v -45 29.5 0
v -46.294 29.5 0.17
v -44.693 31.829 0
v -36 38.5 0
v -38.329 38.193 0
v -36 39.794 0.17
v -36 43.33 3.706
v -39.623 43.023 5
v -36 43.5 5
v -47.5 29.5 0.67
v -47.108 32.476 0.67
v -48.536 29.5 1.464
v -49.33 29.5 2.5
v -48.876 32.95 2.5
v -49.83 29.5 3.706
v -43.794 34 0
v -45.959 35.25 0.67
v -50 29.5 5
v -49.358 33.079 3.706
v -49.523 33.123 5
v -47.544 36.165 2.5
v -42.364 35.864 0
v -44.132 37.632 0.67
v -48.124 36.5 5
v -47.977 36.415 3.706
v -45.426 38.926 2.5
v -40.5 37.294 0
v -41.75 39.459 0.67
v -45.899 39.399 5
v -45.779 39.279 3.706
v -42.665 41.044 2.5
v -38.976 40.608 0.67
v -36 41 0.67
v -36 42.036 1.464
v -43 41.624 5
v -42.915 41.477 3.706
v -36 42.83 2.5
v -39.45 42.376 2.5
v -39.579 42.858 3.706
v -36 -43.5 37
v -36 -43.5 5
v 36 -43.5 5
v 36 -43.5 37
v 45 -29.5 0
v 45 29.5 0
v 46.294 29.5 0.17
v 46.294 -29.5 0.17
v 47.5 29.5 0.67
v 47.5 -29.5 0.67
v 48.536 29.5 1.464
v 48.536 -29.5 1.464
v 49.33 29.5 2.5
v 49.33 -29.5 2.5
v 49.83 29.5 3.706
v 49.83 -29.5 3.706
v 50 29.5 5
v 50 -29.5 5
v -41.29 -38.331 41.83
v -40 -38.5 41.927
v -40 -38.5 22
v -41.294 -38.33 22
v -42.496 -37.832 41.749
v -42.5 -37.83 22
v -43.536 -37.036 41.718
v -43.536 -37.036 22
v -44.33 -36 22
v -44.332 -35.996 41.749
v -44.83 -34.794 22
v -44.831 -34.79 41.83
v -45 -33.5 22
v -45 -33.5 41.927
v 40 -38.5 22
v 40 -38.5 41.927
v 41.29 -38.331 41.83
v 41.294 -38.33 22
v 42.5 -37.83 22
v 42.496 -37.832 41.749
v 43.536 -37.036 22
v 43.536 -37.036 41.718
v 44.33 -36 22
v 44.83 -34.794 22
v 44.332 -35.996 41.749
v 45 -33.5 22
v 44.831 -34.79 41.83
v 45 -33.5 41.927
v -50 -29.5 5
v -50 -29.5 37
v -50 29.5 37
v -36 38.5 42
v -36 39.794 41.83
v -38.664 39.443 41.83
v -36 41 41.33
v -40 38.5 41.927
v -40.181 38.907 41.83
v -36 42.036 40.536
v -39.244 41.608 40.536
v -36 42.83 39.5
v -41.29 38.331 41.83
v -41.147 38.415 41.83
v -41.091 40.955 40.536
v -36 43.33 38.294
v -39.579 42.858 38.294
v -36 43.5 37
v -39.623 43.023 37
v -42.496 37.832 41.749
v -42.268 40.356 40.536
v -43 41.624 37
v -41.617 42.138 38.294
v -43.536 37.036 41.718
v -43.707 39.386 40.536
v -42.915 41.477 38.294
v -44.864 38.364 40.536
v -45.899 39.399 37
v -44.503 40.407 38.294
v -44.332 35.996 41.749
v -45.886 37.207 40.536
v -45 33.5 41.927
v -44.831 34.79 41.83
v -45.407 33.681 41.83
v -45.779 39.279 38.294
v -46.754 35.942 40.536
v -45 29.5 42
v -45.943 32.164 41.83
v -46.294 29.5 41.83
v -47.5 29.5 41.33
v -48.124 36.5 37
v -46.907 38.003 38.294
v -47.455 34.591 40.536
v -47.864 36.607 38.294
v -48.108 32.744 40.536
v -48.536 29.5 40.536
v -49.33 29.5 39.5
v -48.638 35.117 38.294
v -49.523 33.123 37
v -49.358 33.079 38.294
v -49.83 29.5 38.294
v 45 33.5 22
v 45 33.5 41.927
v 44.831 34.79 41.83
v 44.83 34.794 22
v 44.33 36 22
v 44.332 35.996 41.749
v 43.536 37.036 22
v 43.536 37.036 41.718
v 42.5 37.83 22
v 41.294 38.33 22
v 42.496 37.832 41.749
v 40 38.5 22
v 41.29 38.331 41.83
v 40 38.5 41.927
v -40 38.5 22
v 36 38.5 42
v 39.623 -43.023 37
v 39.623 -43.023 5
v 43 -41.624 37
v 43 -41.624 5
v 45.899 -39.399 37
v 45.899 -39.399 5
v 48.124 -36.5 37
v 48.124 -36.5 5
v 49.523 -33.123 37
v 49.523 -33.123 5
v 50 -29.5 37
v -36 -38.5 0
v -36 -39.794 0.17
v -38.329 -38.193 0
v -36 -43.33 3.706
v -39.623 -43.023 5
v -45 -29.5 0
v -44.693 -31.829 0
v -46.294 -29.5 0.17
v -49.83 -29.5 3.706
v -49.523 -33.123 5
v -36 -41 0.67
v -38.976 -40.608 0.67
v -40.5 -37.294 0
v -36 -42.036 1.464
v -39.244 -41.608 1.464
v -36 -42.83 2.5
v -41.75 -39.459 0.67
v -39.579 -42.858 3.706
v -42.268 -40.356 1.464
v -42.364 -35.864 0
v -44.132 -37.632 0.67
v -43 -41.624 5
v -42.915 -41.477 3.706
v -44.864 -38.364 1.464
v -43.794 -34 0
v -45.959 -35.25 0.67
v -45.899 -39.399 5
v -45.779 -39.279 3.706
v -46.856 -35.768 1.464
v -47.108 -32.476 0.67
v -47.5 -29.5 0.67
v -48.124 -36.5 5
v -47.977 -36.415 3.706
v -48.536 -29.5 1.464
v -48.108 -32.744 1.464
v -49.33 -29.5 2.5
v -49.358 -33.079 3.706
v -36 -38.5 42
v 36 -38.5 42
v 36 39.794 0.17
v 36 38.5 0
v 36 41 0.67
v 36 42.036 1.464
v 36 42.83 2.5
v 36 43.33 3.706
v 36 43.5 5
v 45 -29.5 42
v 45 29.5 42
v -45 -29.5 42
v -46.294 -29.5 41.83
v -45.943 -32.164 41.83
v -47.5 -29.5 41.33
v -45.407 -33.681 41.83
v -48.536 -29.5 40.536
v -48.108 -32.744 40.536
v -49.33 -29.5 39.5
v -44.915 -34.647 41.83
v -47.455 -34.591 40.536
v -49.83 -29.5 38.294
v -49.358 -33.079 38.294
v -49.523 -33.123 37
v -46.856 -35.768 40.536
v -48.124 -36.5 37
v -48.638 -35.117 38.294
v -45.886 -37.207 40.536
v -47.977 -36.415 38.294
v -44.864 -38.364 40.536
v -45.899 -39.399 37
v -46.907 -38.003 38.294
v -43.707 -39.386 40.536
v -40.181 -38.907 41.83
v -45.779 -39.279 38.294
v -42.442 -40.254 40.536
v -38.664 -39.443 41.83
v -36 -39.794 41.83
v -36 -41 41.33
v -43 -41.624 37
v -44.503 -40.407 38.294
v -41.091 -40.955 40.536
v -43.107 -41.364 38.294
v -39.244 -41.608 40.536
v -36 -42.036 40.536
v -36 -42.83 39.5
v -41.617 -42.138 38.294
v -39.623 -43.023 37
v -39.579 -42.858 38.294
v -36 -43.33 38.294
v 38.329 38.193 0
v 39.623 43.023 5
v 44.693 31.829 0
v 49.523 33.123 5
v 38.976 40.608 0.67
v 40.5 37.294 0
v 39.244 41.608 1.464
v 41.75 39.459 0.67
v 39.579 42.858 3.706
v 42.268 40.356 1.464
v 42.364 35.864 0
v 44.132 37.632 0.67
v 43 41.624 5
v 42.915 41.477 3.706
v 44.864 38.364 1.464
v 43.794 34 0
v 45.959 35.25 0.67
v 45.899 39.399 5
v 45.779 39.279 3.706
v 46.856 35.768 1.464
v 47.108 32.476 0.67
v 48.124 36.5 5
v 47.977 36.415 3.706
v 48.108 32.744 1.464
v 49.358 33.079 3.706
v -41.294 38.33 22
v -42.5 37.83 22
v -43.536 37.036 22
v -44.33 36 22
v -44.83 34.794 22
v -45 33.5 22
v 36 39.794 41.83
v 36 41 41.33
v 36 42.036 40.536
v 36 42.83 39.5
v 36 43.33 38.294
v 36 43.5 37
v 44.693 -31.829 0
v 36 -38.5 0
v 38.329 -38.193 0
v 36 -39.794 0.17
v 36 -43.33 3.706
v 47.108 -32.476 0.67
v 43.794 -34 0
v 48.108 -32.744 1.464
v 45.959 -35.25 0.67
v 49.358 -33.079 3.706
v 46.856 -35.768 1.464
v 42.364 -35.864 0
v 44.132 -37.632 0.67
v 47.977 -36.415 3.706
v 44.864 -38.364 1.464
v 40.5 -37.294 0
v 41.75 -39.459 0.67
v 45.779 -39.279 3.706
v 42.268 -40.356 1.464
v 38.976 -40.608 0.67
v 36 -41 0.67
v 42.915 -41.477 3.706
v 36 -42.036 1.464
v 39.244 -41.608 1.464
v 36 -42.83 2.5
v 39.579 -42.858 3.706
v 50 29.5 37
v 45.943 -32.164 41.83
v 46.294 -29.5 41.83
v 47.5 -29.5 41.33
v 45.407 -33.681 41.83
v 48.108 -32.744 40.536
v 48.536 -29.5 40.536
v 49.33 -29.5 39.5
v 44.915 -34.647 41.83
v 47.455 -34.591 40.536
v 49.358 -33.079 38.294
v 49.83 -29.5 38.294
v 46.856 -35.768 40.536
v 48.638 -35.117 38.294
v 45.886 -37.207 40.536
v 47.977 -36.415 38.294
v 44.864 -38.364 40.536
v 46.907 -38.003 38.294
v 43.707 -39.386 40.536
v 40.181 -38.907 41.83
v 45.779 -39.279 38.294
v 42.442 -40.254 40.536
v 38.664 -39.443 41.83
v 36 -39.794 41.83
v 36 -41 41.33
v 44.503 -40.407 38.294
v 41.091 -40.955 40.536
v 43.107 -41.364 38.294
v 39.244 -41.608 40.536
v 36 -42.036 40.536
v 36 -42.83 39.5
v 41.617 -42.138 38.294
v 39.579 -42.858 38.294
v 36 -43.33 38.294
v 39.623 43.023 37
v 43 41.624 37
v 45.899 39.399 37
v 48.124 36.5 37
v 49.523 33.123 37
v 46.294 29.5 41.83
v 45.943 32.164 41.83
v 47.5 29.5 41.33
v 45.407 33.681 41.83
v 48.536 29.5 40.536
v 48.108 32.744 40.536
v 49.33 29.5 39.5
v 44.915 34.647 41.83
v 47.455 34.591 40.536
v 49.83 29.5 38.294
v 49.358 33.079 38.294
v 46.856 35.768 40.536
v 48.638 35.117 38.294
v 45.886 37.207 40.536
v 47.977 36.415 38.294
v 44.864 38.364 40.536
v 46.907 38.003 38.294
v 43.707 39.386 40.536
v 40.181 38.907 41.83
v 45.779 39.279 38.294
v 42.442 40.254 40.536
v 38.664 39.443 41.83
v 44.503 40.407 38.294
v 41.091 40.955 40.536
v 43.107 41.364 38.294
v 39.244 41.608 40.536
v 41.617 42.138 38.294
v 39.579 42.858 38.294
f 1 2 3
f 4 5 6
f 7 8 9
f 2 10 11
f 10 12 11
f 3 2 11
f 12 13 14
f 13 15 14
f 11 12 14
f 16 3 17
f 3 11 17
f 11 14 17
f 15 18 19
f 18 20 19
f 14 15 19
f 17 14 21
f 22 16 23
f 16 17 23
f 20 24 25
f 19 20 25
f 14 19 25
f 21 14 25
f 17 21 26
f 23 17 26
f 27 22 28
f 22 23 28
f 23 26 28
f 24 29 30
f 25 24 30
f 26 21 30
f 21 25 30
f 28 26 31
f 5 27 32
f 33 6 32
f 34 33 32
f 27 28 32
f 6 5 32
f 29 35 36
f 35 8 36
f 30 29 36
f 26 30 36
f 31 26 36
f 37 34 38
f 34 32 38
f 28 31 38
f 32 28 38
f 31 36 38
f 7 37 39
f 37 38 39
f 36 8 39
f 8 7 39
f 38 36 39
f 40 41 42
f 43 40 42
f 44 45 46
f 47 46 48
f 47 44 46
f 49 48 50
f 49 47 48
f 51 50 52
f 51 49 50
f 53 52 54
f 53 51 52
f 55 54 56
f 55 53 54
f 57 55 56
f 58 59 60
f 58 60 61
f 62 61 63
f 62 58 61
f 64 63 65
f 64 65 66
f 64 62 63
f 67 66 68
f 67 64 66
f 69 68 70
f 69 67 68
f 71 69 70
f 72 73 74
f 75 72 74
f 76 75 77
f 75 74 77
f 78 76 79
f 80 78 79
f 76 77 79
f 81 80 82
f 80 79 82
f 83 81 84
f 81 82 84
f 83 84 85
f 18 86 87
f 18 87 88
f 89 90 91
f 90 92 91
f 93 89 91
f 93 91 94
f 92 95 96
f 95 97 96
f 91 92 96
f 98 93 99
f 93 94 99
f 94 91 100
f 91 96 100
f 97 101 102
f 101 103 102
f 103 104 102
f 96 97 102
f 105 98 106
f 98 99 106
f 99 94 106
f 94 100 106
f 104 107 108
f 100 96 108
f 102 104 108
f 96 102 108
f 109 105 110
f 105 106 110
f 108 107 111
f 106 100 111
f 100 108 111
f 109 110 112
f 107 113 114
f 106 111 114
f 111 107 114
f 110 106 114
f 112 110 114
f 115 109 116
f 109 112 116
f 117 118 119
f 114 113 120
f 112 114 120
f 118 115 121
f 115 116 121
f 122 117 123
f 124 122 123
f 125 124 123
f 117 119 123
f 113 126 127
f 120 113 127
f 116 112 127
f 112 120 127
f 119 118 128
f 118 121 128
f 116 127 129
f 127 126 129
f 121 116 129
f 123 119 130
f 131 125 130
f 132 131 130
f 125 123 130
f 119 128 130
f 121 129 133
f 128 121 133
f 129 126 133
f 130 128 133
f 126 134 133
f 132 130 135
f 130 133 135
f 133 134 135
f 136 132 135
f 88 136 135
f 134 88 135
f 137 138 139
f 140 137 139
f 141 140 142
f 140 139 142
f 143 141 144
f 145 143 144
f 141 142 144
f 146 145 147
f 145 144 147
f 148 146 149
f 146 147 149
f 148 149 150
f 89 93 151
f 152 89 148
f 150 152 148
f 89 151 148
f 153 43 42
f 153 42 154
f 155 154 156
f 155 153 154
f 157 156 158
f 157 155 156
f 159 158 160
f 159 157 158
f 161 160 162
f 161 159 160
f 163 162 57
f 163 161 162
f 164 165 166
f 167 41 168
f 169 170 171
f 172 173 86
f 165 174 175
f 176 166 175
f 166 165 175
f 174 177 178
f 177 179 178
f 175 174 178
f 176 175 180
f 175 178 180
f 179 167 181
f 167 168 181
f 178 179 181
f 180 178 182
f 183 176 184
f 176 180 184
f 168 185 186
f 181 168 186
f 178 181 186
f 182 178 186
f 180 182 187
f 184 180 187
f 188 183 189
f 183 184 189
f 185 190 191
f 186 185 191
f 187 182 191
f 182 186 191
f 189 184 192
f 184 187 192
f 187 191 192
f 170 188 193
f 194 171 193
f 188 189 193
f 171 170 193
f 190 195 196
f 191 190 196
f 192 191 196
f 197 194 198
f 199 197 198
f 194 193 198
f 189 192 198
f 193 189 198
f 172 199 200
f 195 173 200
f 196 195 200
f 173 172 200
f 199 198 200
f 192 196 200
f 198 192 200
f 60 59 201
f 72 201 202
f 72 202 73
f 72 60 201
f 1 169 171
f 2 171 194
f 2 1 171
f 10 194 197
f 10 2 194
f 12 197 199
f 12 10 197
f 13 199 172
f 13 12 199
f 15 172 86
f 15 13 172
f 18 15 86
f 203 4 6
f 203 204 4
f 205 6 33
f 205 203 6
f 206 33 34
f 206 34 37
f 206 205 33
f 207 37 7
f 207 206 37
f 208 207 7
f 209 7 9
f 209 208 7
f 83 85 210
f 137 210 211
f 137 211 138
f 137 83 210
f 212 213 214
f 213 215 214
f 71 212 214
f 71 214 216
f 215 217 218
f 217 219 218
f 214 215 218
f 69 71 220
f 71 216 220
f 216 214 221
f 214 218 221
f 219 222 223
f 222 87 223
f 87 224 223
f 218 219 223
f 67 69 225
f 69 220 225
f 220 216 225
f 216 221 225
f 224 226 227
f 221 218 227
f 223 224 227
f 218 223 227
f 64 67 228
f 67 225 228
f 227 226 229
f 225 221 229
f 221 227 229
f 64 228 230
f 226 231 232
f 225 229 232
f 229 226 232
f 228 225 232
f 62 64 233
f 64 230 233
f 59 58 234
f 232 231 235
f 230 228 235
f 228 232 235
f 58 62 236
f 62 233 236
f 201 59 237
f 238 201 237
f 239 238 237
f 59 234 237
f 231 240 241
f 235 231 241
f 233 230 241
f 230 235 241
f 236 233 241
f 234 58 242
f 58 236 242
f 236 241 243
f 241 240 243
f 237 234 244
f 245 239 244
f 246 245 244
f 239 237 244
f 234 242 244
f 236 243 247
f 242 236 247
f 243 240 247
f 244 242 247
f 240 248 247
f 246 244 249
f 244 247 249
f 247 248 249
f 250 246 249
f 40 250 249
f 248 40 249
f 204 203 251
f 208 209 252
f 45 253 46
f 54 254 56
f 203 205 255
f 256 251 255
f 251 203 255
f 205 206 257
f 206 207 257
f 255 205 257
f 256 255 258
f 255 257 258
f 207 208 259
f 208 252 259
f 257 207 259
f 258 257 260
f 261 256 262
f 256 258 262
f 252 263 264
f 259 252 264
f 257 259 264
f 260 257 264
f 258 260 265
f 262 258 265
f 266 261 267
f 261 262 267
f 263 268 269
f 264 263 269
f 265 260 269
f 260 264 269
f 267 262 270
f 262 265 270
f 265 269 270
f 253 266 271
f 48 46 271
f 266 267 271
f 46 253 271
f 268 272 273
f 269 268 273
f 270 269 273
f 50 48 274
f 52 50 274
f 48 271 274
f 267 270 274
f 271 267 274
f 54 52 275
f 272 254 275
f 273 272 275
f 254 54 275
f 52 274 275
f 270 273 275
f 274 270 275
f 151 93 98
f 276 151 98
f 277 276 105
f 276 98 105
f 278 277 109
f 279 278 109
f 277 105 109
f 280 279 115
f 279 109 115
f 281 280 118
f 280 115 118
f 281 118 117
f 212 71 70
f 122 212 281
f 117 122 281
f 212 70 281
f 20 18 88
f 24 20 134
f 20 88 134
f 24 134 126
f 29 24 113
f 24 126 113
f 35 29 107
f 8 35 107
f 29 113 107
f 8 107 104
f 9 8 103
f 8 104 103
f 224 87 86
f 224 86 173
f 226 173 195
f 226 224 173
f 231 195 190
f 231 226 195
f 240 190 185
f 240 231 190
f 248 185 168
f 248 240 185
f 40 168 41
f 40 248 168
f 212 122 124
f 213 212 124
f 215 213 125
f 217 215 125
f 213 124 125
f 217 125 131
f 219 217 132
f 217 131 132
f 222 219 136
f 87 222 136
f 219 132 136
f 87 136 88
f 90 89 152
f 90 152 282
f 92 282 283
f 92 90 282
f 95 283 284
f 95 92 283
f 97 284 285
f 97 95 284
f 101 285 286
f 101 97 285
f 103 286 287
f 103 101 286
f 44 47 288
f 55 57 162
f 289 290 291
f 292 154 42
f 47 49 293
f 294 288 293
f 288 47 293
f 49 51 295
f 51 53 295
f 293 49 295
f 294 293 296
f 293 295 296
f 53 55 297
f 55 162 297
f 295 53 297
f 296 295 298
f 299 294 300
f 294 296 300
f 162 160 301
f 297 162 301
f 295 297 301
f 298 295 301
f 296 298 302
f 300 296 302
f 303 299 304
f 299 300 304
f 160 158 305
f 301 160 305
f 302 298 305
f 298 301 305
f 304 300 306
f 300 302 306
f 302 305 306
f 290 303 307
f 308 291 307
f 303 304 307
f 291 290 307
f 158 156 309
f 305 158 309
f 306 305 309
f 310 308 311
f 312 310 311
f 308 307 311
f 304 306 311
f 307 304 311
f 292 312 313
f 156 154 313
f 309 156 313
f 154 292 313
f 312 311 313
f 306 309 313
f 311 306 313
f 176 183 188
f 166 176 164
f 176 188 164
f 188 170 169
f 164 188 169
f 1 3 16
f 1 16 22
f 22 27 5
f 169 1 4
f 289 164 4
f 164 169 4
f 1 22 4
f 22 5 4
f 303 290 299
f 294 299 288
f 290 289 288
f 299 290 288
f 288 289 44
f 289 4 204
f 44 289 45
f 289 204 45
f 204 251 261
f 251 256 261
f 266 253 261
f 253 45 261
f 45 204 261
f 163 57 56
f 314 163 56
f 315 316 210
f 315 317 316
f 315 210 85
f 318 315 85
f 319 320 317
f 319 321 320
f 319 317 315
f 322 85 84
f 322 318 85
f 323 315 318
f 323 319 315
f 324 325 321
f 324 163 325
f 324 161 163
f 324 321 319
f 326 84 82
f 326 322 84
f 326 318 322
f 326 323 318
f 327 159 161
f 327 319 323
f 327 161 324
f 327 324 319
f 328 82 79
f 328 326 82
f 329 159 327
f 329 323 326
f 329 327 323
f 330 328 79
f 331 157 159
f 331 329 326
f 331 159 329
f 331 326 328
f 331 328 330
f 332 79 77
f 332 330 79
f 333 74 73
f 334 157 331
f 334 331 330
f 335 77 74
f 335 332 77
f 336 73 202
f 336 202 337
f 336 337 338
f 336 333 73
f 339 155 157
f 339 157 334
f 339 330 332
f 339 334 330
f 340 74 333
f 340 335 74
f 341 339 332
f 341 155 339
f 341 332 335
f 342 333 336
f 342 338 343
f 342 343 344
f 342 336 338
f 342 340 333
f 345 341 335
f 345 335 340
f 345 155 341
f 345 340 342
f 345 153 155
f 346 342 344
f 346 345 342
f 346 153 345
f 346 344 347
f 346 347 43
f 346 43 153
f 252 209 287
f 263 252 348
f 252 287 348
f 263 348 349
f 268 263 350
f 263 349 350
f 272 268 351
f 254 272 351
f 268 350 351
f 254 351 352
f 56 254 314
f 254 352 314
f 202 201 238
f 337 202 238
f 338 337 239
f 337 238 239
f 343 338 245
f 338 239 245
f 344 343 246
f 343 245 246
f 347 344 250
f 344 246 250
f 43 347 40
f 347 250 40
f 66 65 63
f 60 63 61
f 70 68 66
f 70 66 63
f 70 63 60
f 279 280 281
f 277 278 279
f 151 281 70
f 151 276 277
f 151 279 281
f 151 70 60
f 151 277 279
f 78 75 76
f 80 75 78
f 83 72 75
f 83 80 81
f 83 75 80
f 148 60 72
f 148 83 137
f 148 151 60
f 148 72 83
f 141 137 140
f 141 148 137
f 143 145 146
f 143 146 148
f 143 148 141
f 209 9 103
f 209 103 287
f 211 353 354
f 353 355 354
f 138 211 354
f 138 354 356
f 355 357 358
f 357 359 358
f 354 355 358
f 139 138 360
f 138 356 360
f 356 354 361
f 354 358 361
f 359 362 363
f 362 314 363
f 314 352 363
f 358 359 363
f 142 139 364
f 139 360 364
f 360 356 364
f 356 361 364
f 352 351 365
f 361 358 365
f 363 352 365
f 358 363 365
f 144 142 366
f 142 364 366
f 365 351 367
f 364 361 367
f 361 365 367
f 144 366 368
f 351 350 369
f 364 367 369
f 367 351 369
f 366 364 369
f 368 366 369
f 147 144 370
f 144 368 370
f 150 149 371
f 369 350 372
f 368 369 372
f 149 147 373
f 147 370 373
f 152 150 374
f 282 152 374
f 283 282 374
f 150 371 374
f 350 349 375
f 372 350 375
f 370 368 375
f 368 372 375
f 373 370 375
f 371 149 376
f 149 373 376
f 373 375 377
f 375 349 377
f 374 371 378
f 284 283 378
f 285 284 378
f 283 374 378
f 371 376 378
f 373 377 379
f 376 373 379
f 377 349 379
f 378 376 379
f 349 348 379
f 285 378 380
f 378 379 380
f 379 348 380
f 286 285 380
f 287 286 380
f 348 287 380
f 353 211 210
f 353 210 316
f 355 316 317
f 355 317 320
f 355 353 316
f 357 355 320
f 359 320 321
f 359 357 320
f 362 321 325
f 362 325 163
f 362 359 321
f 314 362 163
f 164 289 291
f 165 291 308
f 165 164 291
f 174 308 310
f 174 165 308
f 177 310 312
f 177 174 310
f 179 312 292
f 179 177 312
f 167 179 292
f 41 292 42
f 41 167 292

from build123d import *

# Parameters (mm, degrees)
F0_W         = 90
F0_H         = 77
F1_DEPTH     = 22
F0_W_2       = 100
F0_H_2       = 87
F2_DEPTH     = 42
F3_R         = 14
F4_R         = 5
F5_R         = 5
F6_T1_DEPTH  = 72
F6_T3_DEPTH  = 59
F6_T6_ANGLE  = 90
F6_T8_ANGLE  = 90
F6_T10_ANGLE = 90
F6_T12_ANGLE = 90


# Not quite as in the source:
# - a fillet or chamfer that OpenCascade refuses, or shapes differently, is made with other operations: its cross-section is extruded or revolved along the edge and cut away or added


with BuildPart() as f1:
    # F0 (on Top) → F1 (new body)
    with BuildSketch(Plane.XY):
        Rectangle(F0_W, F0_H)
    extrude(amount=F1_DEPTH)

    # F0 (on Top) → F2 (join)
    with BuildSketch(Plane.XY):
        Rectangle(F0_W_2, F0_H_2)
        Rectangle(F0_W, F0_H, mode=Mode.SUBTRACT)
    extrude(amount=F2_DEPTH)

    # F3
    f3_edges = [f1.edges().sort_by_distance(p)[0] for p in [
        (-50, -43.5, 21),
        (-50, 43.5, 21),
        (50, 43.5, 21),
        (50, -43.5, 21),
    ]]
    fillet(f3_edges, radius=F3_R)

    # F4
    f4_edges = [f1.edges().sort_by_distance(p)[0] for p in [
        (0, 43.5, 0),
    ]]
    fillet(f4_edges, radius=F4_R)

    # F5
    f5_edges = [f1.edges().sort_by_distance(p)[0] for p in [
        (-45, -38.5, 32),
        (45, -38.5, 32),
        (-45, 38.5, 32),
        (45, 38.5, 32),
    ]]
    fillet(f5_edges, radius=F5_R)

    # F6: fillet of radius 5 on 8 edges, made by hand

    # F6_s2 → F6_t1 (cut)
    with BuildSketch(Plane.YZ.offset(-36)):
        with BuildLine():
            ThreePointArc((-38.5, 42), (-42.0355339059, 40.5355339059), (-43.5, 37))
            Line((-43.5, 37), (-43.5, 42))
            Line((-43.5, 42), (-38.5, 42))
        make_face()
        with BuildLine():
            ThreePointArc((38.5, 42), (42.0355339059, 40.5355339059), (43.5, 37))
            Line((43.5, 37), (43.5, 42))
            Line((43.5, 42), (38.5, 42))
        make_face()
    extrude(amount=F6_T1_DEPTH, mode=Mode.SUBTRACT)

    # F6_s4 → F6_t3 (cut)
    with BuildSketch(Plane.XZ.offset(-29.5)):
        with BuildLine():
            ThreePointArc((45, 42), (48.5355339059, 40.5355339059), (50, 37))
            Line((50, 37), (50, 42))
            Line((50, 42), (45, 42))
        make_face()
        with BuildLine():
            ThreePointArc((-45, 42), (-48.5355339059, 40.5355339059), (-50, 37))
            Line((-50, 37), (-50, 42))
            Line((-50, 42), (-45, 42))
        make_face()
    extrude(amount=F6_T3_DEPTH, mode=Mode.SUBTRACT)

    # F6_s5 → F6_t6 (revolve, cut)
    with BuildSketch(Plane.XZ.offset(29.5)):
        with BuildLine():
            ThreePointArc((45, 42), (48.5355339059, 40.5355339059), (50, 37))
            Line((50, 37), (50, 42))
            Line((50, 42), (45, 42))
        make_face()
    revolve(axis=Axis((36, -29.5, 42), (0, 0, -1)), revolution_arc=F6_T6_ANGLE, mode=Mode.SUBTRACT)

    # F6_s7 → F6_t8 (revolve, cut)
    with BuildSketch(Plane.XZ.offset(-29.5)):
        with BuildLine():
            ThreePointArc((45, 42), (48.5355339059, 40.5355339059), (50, 37))
            Line((50, 37), (50, 42))
            Line((50, 42), (45, 42))
        make_face()
    revolve(axis=Axis((36, 29.5, 42), (0, 0, 1)), revolution_arc=F6_T8_ANGLE, mode=Mode.SUBTRACT)

    # F6_s9 → F6_t10 (revolve, cut)
    with BuildSketch(Plane.XZ.offset(29.5)):
        with BuildLine():
            ThreePointArc((-45, 42), (-48.5355339059, 40.5355339059), (-50, 37))
            Line((-50, 37), (-50, 42))
            Line((-50, 42), (-45, 42))
        make_face()
    revolve(axis=Axis((-36, -29.5, 42), (0, 0, 1)), revolution_arc=F6_T10_ANGLE, mode=Mode.SUBTRACT)

    # F6_s11 → F6_t12 (revolve, cut)
    with BuildSketch(Plane.YZ.offset(-36)):
        with BuildLine():
            ThreePointArc((38.5, 42), (42.0355339059, 40.5355339059), (43.5, 37))
            Line((43.5, 37), (43.5, 42))
            Line((43.5, 42), (38.5, 42))
        make_face()
    revolve(axis=Axis((-36, 29.5, 42), (0, 0, 1)), revolution_arc=F6_T12_ANGLE, mode=Mode.SUBTRACT)


solid = f1.part
